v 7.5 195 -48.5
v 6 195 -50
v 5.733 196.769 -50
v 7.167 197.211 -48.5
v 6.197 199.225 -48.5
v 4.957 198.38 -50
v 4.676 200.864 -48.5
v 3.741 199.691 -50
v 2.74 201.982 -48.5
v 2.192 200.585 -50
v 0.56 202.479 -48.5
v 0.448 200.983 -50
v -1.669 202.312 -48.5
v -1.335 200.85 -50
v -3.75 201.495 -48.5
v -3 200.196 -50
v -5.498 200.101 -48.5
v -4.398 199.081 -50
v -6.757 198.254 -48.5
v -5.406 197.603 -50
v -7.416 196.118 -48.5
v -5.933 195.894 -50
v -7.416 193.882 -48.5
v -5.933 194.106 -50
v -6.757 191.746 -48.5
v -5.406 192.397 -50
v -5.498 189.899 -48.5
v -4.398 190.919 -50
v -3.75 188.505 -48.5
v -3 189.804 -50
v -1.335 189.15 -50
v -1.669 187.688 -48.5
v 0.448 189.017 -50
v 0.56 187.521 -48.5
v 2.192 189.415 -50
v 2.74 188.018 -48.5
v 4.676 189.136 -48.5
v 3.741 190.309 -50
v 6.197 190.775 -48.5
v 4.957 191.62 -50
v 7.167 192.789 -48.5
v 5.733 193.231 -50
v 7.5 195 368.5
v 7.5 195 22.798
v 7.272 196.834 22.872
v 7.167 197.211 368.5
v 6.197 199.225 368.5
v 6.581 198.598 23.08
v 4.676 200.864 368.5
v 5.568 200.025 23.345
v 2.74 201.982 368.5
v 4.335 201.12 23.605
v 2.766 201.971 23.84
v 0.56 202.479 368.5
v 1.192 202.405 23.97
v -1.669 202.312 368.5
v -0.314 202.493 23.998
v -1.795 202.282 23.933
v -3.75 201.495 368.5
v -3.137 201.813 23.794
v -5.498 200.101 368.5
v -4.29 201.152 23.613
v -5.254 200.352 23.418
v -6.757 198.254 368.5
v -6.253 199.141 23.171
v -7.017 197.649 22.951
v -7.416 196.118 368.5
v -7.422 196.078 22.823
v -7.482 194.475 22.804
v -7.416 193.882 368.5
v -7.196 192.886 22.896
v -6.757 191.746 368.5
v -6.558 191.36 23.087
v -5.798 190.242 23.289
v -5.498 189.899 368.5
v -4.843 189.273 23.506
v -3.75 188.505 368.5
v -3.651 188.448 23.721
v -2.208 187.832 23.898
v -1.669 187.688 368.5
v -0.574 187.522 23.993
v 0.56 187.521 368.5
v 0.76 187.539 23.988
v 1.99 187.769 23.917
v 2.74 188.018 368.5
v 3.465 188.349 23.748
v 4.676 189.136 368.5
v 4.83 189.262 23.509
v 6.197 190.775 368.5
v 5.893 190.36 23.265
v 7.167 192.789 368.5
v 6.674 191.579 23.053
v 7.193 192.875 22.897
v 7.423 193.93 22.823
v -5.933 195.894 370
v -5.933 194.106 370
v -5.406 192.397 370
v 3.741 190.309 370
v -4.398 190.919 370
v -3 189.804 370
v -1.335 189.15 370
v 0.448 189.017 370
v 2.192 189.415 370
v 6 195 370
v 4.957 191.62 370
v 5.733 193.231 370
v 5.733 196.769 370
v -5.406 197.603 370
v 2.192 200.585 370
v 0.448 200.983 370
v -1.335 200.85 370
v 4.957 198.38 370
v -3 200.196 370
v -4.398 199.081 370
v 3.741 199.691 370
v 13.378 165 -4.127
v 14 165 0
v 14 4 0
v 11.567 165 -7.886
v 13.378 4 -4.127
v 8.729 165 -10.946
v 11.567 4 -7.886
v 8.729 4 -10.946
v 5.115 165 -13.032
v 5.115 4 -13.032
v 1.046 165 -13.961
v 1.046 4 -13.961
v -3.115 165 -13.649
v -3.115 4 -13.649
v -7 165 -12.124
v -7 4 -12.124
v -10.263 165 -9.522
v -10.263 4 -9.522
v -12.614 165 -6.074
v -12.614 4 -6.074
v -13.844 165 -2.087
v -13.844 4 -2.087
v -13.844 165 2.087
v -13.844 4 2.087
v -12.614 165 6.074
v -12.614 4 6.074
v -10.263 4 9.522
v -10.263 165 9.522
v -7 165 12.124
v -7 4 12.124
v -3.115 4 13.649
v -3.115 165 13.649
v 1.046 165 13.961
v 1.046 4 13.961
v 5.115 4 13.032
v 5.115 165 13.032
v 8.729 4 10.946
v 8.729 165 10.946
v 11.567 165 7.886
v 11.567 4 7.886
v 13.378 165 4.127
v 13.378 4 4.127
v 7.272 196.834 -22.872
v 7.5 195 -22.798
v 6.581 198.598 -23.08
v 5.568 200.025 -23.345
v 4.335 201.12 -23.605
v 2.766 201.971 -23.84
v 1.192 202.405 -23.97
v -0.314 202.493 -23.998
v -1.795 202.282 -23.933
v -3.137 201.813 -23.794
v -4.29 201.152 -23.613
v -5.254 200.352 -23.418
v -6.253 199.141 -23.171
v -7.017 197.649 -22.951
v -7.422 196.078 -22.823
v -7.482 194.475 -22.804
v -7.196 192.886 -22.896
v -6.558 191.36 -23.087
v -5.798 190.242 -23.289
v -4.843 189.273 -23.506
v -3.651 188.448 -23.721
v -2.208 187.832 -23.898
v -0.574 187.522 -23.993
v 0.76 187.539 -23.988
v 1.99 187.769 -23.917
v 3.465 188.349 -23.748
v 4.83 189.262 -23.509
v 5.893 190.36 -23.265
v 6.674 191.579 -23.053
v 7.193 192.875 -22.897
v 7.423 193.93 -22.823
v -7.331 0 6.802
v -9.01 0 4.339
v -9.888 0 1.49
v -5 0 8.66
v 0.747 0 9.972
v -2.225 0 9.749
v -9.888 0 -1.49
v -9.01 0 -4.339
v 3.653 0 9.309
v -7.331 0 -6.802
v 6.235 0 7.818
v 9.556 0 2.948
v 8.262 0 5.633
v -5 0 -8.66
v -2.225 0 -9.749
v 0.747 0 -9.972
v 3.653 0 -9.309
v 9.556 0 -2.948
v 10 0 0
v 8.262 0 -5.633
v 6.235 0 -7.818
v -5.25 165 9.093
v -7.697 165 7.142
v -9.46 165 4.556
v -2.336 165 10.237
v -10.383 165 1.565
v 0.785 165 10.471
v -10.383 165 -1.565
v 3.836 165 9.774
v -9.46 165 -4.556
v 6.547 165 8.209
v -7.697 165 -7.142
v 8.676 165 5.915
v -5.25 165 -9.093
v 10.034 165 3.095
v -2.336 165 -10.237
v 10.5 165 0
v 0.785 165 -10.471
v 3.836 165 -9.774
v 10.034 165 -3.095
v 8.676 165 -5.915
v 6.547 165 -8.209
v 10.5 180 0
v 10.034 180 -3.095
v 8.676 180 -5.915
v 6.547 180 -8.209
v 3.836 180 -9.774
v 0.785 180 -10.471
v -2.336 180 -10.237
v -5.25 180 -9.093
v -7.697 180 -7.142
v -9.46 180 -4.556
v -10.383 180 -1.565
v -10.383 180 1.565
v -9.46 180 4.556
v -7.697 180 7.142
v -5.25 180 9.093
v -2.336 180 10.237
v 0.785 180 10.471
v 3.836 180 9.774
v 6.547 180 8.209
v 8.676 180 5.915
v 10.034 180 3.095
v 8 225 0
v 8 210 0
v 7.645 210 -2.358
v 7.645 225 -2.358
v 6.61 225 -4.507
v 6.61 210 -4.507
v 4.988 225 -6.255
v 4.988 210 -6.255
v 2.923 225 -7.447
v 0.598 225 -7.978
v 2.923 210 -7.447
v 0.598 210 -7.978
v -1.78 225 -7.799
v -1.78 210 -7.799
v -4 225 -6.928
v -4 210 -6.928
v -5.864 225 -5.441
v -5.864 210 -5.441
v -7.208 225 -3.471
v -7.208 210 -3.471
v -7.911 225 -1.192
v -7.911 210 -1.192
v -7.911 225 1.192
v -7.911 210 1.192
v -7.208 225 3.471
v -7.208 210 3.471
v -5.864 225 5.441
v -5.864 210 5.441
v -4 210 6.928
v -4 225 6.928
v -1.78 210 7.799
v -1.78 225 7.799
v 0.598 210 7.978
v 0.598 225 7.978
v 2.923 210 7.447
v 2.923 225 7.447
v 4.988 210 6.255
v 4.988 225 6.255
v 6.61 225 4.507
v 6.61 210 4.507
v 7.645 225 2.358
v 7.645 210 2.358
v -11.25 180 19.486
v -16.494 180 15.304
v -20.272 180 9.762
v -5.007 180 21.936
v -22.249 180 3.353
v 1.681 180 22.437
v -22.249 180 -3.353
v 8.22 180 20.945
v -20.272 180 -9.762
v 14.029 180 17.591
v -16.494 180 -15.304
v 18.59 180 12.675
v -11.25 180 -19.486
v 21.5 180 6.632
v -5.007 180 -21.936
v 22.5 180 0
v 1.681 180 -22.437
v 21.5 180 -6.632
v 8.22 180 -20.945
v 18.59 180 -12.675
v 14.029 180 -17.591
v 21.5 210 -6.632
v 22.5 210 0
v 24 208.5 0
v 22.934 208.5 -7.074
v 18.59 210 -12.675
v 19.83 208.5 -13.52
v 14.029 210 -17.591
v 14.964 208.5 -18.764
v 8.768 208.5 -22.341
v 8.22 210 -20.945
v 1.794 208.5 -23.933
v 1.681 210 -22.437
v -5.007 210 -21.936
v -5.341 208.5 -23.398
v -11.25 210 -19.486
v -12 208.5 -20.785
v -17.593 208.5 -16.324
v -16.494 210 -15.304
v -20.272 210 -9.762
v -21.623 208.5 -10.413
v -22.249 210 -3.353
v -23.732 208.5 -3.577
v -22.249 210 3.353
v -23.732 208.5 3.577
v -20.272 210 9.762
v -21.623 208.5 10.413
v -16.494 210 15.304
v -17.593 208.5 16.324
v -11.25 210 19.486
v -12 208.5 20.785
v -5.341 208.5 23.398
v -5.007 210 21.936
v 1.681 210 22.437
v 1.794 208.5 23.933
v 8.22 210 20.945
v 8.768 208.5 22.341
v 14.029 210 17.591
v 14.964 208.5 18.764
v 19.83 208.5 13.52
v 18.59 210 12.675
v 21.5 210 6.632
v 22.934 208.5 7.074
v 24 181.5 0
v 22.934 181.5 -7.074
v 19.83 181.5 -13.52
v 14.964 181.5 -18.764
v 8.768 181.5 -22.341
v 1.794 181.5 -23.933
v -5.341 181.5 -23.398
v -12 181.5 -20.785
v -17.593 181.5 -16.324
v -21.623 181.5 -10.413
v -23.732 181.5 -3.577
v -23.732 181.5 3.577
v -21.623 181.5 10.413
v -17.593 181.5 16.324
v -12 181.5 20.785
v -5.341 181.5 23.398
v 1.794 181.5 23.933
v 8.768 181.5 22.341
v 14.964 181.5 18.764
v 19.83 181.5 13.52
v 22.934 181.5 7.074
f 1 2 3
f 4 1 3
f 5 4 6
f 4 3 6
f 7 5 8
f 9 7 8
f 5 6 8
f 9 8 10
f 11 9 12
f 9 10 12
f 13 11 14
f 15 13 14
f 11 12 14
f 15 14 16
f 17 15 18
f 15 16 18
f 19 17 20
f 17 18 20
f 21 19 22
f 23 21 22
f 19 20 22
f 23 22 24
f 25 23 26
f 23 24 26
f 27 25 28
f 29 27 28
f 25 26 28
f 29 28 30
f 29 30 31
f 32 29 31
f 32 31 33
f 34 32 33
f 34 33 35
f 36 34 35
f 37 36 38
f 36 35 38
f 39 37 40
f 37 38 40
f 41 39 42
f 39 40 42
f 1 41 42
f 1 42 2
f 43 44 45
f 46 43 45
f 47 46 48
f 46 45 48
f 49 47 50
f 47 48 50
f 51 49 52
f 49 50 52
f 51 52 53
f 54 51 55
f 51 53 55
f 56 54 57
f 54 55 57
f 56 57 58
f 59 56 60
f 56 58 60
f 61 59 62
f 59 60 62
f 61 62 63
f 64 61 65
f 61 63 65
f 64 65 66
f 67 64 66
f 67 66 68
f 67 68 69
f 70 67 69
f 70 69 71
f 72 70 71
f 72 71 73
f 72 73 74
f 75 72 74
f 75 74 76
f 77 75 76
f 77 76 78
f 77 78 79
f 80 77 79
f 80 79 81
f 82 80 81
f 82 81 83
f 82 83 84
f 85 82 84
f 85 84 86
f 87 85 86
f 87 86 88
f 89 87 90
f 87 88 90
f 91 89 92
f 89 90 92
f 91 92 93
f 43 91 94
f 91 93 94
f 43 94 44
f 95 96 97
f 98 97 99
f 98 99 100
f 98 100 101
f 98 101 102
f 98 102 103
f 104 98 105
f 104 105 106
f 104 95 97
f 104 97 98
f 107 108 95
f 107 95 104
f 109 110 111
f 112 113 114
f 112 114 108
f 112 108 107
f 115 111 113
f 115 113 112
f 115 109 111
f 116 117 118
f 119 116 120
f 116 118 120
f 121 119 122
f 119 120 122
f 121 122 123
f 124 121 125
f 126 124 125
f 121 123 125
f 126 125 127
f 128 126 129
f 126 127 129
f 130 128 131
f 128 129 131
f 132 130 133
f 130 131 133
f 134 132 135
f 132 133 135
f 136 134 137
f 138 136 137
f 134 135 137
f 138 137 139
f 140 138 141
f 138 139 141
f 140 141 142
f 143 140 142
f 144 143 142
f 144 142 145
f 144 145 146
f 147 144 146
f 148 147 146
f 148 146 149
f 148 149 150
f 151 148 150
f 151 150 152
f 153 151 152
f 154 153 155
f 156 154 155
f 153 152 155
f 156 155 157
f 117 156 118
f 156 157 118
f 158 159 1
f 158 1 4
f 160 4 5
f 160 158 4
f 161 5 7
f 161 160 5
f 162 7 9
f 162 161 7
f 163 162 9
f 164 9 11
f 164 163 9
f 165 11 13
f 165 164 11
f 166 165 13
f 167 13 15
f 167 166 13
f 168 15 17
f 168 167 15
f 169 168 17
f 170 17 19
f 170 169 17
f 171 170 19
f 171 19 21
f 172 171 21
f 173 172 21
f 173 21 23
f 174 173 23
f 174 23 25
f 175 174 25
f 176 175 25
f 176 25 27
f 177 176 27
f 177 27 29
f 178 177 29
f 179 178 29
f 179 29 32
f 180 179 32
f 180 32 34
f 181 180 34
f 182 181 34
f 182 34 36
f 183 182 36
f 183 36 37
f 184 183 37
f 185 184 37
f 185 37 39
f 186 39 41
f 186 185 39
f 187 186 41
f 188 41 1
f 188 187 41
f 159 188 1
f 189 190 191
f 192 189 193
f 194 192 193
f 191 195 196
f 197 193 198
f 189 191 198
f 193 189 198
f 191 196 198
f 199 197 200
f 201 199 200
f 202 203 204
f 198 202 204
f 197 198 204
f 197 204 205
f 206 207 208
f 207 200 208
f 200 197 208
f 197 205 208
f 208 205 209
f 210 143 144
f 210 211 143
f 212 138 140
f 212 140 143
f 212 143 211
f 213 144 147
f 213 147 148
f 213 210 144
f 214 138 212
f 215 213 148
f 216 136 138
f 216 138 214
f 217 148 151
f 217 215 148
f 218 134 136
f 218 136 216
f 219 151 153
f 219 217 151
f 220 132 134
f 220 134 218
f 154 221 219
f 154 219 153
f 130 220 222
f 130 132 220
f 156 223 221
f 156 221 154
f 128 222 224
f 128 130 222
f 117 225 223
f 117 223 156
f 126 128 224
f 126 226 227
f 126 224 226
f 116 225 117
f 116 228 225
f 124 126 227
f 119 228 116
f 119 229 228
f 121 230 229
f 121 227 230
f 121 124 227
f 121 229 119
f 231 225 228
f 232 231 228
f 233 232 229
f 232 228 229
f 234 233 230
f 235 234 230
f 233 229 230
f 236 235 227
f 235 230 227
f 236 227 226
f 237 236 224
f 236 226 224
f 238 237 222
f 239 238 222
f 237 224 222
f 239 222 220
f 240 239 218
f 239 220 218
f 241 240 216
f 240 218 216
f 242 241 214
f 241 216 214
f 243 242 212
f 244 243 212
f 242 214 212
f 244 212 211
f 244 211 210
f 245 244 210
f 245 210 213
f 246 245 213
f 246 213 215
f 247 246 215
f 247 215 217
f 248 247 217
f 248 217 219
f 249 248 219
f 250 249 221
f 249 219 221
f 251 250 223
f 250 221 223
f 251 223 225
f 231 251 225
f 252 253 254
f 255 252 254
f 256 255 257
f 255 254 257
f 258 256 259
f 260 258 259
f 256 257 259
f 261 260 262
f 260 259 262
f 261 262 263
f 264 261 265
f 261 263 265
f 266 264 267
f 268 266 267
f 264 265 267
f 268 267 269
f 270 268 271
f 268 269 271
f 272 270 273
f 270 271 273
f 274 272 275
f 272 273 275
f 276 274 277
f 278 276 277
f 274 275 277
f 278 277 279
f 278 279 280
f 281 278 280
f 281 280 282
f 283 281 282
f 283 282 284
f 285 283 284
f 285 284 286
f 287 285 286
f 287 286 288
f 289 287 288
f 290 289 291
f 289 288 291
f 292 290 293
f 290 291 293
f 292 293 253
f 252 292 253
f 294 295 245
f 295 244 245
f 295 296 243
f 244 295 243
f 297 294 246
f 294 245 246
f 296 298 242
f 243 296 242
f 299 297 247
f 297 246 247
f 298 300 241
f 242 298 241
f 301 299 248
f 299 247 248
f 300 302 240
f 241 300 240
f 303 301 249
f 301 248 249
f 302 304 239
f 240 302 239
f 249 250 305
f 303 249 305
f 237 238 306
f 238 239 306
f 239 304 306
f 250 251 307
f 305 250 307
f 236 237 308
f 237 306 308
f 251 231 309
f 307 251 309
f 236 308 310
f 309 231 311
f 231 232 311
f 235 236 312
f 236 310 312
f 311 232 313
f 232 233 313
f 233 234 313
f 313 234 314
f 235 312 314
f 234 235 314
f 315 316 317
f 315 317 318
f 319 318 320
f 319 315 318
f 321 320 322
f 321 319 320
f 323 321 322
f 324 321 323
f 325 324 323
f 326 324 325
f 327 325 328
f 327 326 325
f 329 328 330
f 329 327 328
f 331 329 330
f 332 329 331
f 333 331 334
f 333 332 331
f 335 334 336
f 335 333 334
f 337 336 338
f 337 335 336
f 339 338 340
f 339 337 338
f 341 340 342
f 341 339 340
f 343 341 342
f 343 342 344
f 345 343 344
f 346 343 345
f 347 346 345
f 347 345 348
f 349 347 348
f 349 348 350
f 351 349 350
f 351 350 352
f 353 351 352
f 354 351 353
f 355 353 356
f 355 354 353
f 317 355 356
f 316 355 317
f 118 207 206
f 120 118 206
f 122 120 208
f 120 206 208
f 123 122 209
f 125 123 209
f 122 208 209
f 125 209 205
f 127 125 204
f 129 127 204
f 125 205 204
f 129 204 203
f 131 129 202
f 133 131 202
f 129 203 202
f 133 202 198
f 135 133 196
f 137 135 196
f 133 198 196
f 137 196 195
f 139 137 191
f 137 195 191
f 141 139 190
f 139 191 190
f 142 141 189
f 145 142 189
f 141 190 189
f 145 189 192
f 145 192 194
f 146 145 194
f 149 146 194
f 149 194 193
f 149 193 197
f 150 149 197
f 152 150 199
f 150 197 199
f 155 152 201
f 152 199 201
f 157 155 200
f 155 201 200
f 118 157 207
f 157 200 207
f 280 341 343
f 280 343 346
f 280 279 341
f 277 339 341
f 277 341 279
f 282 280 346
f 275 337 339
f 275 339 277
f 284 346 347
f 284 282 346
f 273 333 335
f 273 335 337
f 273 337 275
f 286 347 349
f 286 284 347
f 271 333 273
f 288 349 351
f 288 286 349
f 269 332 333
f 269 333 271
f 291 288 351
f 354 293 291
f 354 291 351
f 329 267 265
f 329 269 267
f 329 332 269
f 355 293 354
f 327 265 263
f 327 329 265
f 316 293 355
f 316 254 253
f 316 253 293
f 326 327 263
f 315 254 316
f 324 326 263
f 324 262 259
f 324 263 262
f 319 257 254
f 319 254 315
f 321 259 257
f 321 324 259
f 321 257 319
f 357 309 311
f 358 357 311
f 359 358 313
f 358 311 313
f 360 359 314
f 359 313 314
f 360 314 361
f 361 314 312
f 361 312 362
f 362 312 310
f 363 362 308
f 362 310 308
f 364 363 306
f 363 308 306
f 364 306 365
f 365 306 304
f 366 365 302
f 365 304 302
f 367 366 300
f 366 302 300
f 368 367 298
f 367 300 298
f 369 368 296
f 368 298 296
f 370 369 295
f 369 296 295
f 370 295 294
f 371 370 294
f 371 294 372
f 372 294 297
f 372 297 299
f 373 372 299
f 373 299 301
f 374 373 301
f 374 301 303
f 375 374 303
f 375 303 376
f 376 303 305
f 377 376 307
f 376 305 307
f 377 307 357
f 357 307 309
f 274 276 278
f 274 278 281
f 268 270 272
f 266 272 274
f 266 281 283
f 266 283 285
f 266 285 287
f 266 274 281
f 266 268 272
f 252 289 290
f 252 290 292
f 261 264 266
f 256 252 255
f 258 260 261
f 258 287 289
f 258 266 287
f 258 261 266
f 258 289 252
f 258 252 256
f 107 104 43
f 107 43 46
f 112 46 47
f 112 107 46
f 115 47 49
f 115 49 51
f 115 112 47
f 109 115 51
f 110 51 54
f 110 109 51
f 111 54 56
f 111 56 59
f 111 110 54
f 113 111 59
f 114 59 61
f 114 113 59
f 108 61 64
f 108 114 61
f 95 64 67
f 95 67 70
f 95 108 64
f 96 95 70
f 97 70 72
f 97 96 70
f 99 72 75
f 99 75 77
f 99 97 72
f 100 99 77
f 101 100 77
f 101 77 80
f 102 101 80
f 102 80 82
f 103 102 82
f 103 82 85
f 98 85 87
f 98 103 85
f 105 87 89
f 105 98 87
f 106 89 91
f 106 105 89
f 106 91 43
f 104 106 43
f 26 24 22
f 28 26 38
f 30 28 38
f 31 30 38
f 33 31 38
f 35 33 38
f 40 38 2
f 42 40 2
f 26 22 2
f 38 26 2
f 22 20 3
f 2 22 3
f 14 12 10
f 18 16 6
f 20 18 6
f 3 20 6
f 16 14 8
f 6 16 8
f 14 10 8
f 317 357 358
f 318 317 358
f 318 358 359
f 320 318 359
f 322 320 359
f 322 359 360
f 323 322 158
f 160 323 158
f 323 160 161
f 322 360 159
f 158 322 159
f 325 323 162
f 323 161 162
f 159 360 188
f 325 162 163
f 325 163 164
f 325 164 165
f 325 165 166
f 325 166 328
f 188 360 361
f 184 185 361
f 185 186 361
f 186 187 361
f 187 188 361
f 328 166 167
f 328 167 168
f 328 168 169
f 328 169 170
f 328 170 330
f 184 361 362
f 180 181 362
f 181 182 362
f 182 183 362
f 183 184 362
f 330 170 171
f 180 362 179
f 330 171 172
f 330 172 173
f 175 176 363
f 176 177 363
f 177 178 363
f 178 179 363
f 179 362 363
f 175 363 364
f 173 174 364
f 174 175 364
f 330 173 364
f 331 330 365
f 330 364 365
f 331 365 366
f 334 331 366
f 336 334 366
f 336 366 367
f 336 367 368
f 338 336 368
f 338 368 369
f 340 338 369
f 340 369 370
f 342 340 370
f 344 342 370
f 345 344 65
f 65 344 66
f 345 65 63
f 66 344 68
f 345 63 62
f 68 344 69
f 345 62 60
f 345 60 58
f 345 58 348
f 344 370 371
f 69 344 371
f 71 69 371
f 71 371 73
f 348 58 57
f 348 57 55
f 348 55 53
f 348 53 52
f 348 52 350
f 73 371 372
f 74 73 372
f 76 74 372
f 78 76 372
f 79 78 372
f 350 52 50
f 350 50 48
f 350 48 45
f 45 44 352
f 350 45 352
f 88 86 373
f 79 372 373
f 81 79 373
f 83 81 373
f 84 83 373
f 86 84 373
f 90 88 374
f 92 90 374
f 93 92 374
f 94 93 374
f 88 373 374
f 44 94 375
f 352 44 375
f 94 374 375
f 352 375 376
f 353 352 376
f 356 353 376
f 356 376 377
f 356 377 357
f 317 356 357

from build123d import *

# Parameters (mm, degrees)
SKETCH_1_R           = 14
EXTRUDE_1_DEPTH      = 165
SKETCH_2_R           = 10.5
EXTRUDE_2_DEPTH      = 15
CHAMFER_2_SIZE       = 4
SKETCH_4_R           = 24
EXTRUDE_3_DEPTH      = 30
SKETCH_5_R           = 8
EXTRUDE_4_DEPTH      = 15
SKETCH_6_R           = 7.5
EXTRUDE_5_DEPTH      = 370
EXTRUDE_5_DEPTH_BACK = 50
CHAMFER_3_SIZE       = 1.5


with BuildPart() as part:
    # 草图1 → 凸台-拉伸1 (new body)
    with BuildSketch(Plane(origin=(0, 0, 0), x_dir=(1, 0, 0), z_dir=(0, 1, 0))):
        Circle(SKETCH_1_R)
    extrude(amount=EXTRUDE_1_DEPTH)

    # 草图2 → 凸台-拉伸2 (add)
    with BuildSketch(Plane(origin=(0, 165, 0), x_dir=(1, 0, 0), z_dir=(0, 1, 0))):
        Circle(SKETCH_2_R)
    extrude(amount=EXTRUDE_2_DEPTH)

    # 倒角2
    chamfer_2_edges = [part.edges().sort_by_distance(p)[0] for p in [
        (-14, 0, 0),
    ]]
    chamfer(chamfer_2_edges, length=CHAMFER_2_SIZE)

    # 草图4 → 凸台-拉伸3 (add)
    with BuildSketch(Plane(origin=(0, 180, 0), x_dir=(1, 0, 0), z_dir=(0, 1, 0))):
        Circle(SKETCH_4_R)
    extrude(amount=EXTRUDE_3_DEPTH)

    # 草图5 → 凸台-拉伸4 (add)
    with BuildSketch(Plane(origin=(0, 210, 0), x_dir=(1, 0, 0), z_dir=(0, 1, 0))):
        Circle(SKETCH_5_R)
    extrude(amount=EXTRUDE_4_DEPTH)

    # 草图6 → 凸台-拉伸5 (add, two sides)
    with BuildSketch(Plane.XY) as extrude_5_sk:
        with Locations((0, 195)):
            Circle(SKETCH_6_R)
    extrude(amount=EXTRUDE_5_DEPTH)
    extrude(extrude_5_sk.sketch, amount=-EXTRUDE_5_DEPTH_BACK)

    # 倒角3
    chamfer_3_edges = [part.edges().sort_by_distance(p)[0] for p in [
        (-24, 180, 0),
        (-24, 210, 0),
        (-7.5, 195, -50),
        (-7.5, 195, 370),
    ]]
    chamfer(chamfer_3_edges, length=CHAMFER_3_SIZE)


solid = part.part
